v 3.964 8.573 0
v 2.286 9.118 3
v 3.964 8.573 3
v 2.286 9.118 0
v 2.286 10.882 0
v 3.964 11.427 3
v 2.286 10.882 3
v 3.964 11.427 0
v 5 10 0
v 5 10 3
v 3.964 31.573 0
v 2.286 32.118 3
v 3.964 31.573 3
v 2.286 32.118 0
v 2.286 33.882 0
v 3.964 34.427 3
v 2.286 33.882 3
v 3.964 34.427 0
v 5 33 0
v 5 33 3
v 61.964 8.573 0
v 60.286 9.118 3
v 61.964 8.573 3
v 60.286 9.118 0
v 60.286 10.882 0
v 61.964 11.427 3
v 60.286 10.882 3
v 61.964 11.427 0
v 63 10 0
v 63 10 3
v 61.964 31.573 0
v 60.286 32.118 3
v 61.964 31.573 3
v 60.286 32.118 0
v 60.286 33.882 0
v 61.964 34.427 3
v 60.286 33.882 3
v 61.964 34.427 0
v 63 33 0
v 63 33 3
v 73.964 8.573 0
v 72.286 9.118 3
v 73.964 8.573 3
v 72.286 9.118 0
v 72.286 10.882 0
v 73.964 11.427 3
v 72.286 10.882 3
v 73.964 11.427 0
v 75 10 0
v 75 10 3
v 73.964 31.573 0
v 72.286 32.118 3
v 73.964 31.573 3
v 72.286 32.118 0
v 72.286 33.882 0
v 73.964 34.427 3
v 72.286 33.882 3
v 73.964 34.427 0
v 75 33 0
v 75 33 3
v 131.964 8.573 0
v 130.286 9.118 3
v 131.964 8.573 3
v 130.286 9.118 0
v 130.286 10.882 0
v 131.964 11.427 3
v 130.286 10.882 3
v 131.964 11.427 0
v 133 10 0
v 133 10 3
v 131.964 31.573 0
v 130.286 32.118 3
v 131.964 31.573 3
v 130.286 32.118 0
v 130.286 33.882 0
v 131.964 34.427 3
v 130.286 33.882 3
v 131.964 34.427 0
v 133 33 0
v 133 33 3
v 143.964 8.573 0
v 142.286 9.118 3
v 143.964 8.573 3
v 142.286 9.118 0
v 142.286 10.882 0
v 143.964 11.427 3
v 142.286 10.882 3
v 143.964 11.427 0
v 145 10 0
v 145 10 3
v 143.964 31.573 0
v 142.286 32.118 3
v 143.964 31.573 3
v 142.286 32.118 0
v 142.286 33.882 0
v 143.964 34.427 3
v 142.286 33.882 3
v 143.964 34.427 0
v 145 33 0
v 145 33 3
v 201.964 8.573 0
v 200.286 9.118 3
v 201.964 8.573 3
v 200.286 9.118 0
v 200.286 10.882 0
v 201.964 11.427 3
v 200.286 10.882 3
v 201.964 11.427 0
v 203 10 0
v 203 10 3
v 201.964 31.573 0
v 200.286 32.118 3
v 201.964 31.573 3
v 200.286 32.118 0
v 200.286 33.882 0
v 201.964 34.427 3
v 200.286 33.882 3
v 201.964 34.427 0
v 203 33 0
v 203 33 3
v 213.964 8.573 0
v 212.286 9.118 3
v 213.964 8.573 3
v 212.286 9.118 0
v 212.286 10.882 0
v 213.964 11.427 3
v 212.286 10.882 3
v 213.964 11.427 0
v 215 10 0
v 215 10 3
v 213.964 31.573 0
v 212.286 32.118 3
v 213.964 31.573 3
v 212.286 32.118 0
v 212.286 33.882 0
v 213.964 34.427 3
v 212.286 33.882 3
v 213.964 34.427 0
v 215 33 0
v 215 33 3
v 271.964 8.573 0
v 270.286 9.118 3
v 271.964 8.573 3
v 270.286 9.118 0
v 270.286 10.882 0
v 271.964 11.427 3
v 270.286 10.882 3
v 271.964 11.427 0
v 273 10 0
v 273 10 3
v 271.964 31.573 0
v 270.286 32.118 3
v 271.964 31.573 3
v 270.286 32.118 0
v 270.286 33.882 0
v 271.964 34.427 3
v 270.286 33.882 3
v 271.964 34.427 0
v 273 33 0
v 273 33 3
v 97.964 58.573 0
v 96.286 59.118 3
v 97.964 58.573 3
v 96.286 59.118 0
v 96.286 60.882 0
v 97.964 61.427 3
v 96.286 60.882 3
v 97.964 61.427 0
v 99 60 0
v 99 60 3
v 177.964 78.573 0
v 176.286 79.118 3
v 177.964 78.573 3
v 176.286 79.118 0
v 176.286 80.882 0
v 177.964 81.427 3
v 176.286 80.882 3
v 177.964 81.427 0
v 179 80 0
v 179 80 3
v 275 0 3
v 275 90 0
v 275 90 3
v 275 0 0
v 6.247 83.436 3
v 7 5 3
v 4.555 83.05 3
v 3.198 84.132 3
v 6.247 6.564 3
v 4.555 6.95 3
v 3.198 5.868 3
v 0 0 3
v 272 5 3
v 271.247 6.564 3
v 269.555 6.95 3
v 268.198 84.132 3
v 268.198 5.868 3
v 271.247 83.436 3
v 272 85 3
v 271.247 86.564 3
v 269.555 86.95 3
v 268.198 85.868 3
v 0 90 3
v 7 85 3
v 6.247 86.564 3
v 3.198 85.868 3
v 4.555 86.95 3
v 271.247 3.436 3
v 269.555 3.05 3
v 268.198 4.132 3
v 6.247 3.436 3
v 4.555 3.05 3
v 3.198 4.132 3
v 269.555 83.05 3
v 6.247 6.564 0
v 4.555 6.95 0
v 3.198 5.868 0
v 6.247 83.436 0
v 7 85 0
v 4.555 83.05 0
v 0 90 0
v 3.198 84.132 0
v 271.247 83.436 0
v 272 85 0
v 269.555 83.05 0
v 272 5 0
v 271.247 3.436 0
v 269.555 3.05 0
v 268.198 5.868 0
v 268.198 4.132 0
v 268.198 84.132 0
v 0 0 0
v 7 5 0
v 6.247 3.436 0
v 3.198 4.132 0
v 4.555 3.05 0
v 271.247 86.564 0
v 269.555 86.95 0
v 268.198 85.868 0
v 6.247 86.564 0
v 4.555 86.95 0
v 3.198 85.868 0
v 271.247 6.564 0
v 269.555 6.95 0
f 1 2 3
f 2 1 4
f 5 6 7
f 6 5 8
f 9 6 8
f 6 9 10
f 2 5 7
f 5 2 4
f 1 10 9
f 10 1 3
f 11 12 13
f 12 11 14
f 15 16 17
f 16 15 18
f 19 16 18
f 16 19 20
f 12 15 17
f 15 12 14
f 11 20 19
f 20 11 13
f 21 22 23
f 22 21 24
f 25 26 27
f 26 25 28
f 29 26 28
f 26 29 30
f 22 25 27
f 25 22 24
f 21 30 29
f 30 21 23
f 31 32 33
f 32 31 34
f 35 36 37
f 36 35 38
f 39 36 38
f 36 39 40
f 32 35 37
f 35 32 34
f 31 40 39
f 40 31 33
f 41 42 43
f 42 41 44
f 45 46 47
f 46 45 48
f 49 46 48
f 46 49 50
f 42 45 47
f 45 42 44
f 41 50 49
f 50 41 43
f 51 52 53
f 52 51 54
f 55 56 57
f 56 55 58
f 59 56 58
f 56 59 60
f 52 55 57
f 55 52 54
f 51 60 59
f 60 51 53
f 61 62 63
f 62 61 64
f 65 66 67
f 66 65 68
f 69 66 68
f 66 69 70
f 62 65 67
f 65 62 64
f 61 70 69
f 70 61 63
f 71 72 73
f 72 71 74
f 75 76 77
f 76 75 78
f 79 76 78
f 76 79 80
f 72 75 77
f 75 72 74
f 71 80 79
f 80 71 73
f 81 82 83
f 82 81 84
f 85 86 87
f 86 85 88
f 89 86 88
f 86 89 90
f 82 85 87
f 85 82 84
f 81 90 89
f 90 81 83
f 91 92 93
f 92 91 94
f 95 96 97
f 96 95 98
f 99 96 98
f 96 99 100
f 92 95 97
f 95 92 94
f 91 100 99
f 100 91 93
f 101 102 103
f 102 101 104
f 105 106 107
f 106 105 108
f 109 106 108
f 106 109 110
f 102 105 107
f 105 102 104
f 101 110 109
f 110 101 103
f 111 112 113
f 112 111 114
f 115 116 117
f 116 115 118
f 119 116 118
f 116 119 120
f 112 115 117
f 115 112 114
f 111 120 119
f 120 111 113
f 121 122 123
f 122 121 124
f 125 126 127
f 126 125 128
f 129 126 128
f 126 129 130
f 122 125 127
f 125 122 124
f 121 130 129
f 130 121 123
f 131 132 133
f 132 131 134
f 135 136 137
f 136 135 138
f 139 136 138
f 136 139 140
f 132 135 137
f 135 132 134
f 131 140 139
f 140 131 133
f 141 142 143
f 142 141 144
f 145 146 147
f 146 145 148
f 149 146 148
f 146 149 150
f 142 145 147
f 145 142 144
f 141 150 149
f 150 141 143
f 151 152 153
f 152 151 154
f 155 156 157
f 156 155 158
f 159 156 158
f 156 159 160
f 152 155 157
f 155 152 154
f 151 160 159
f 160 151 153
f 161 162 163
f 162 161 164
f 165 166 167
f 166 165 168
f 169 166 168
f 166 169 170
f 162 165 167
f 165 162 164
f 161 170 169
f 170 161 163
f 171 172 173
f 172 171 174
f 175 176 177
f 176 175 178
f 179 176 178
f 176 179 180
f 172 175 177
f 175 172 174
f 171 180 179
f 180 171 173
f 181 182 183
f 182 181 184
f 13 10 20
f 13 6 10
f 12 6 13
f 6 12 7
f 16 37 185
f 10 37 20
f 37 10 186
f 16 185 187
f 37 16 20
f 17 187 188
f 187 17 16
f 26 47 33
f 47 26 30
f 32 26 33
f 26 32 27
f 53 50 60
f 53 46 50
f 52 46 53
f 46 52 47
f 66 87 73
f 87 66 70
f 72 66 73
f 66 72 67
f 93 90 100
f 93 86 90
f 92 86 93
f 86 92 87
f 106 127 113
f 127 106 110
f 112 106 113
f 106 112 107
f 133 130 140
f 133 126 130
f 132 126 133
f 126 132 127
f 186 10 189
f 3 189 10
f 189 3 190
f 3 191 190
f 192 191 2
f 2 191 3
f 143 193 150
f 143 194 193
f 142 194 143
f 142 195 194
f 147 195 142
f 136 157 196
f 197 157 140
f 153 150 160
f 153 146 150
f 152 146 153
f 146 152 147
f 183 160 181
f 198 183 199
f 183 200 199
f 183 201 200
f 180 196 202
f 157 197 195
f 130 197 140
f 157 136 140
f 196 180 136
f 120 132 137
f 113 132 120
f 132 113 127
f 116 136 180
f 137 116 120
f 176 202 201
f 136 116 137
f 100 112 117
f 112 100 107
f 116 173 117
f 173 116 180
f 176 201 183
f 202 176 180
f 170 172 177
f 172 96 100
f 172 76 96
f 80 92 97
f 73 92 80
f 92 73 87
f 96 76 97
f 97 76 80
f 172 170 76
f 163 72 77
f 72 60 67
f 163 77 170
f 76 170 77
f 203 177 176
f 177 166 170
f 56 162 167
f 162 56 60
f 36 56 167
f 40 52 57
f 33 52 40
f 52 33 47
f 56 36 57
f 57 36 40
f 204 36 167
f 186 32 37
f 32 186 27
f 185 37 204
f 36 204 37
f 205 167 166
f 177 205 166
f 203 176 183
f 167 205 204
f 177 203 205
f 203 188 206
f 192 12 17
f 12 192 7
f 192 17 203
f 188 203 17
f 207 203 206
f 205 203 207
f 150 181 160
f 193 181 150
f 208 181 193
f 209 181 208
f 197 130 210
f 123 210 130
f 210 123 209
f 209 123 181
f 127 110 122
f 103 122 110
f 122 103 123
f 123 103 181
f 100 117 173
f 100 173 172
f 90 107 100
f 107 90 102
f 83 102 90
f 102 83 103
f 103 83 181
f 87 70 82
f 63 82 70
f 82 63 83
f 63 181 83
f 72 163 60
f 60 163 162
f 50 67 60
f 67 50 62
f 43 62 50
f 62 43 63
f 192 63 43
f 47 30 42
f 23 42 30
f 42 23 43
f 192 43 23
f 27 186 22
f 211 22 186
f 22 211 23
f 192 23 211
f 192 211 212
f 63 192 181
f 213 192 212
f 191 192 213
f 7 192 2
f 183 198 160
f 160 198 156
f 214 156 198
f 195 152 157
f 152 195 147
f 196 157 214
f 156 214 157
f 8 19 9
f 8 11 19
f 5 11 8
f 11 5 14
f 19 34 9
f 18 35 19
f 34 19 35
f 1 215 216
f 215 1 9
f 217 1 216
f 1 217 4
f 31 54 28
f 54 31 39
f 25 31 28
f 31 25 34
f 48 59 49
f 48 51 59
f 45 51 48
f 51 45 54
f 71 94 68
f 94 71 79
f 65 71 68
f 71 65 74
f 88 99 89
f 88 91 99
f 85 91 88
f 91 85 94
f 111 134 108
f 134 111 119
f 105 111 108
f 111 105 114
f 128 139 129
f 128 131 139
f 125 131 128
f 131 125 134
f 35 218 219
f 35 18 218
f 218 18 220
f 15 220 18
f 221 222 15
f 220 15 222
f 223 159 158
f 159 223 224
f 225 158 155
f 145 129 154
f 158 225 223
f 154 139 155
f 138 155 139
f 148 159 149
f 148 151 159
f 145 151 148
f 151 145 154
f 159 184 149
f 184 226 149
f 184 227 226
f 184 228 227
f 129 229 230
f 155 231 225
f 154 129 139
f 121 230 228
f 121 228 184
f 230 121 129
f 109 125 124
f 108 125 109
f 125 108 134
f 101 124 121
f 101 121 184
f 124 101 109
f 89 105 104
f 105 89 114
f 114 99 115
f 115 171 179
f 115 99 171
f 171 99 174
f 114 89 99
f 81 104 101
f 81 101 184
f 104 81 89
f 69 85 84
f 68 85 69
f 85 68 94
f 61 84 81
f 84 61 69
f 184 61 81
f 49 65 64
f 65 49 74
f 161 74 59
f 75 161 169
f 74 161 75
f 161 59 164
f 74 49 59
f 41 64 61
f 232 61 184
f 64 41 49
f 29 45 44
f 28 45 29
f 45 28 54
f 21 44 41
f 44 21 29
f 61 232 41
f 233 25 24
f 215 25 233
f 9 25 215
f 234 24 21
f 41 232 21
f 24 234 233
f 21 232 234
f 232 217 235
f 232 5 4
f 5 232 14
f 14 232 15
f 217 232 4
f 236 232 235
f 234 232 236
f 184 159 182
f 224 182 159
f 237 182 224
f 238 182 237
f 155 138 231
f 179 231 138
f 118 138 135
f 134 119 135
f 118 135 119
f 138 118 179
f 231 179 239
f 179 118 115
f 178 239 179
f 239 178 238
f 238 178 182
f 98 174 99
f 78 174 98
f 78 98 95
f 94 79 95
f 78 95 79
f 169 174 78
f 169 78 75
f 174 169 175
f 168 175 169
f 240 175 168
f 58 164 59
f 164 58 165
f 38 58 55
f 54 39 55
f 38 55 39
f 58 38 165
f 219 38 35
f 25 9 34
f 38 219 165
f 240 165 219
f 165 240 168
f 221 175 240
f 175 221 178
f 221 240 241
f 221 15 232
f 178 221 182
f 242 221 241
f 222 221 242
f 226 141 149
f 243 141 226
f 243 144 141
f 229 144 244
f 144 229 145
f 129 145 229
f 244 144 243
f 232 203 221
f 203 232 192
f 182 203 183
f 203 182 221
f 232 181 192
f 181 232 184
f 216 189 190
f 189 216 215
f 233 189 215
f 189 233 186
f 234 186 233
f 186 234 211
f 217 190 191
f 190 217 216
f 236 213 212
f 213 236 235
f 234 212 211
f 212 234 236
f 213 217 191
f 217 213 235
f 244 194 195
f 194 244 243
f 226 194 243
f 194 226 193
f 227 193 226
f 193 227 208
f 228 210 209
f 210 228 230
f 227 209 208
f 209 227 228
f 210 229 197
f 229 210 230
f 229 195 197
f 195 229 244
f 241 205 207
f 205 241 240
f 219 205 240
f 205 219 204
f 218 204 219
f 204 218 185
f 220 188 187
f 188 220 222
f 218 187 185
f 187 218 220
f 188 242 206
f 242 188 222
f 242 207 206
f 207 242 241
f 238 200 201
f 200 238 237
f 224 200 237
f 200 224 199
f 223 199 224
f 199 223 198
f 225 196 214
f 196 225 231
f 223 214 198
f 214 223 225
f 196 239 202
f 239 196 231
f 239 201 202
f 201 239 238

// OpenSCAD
// Raspberry Pi Zero Flat Wall Rack for 4 units + USB Hub
// Dimensions in mm

// Parameters
pi_length = 65;
pi_width = 30;
pi_hole_spacing_x = 58;
pi_hole_spacing_y = 23;
pi_hole_diameter = 3; // screw hole size
pi_spacing = 5; // spacing between boards

hub_length = 100; // adjust to your hub size
hub_width = 40;
hub_hole_diameter = 3;

// Tray dimensions
tray_length = 4*pi_length + 3*pi_spacing;
tray_width = pi_width + hub_width + 20;
tray_thickness = 3;

// Module for screw hole
module hole(d=3) {
    cylinder(d=d, h=10, center=true);
}

// Module for one Pi Zero mount
module pi_mount(x_offset, y_offset) {
    translate([x_offset, y_offset, tray_thickness/2])
        for (x=[0, pi_hole_spacing_x])
            for (y=[0, pi_hole_spacing_y])
                translate([x, y, 0])
                    hole(pi_hole_diameter);
}

// Module for USB Hub mount (2 screw holes)
module hub_mount(x_offset, y_offset) {
    translate([x_offset, y_offset, tray_thickness/2]) {
        translate([10, 10, 0]) hole(hub_hole_diameter);
        translate([hub_length-10, hub_width-10, 0]) hole(hub_hole_diameter);
    }
}

// Main tray
difference() {
    // Base plate
    cube([tray_length, tray_width, tray_thickness]);

    // Corner mounting holes for wall screws
    translate([5, 5, tray_thickness/2]) hole(4);
    translate([tray_length-5, 5, tray_thickness/2]) hole(4);
    translate([5, tray_width-5, tray_thickness/2]) hole(4);
    translate([tray_length-5, tray_width-5, tray_thickness/2]) hole(4);

    // Pi Zero screw holes
    for (i=[0:3]) {
        x_pos = i*(pi_length+pi_spacing)+ (pi_length-pi_hole_spacing_x)/2;
        y_pos = 10;
        pi_mount(x_pos, y_pos);
    }

    // USB Hub screw holes
    hub_mount((tray_length-hub_length)/2, pi_width+20);
}
